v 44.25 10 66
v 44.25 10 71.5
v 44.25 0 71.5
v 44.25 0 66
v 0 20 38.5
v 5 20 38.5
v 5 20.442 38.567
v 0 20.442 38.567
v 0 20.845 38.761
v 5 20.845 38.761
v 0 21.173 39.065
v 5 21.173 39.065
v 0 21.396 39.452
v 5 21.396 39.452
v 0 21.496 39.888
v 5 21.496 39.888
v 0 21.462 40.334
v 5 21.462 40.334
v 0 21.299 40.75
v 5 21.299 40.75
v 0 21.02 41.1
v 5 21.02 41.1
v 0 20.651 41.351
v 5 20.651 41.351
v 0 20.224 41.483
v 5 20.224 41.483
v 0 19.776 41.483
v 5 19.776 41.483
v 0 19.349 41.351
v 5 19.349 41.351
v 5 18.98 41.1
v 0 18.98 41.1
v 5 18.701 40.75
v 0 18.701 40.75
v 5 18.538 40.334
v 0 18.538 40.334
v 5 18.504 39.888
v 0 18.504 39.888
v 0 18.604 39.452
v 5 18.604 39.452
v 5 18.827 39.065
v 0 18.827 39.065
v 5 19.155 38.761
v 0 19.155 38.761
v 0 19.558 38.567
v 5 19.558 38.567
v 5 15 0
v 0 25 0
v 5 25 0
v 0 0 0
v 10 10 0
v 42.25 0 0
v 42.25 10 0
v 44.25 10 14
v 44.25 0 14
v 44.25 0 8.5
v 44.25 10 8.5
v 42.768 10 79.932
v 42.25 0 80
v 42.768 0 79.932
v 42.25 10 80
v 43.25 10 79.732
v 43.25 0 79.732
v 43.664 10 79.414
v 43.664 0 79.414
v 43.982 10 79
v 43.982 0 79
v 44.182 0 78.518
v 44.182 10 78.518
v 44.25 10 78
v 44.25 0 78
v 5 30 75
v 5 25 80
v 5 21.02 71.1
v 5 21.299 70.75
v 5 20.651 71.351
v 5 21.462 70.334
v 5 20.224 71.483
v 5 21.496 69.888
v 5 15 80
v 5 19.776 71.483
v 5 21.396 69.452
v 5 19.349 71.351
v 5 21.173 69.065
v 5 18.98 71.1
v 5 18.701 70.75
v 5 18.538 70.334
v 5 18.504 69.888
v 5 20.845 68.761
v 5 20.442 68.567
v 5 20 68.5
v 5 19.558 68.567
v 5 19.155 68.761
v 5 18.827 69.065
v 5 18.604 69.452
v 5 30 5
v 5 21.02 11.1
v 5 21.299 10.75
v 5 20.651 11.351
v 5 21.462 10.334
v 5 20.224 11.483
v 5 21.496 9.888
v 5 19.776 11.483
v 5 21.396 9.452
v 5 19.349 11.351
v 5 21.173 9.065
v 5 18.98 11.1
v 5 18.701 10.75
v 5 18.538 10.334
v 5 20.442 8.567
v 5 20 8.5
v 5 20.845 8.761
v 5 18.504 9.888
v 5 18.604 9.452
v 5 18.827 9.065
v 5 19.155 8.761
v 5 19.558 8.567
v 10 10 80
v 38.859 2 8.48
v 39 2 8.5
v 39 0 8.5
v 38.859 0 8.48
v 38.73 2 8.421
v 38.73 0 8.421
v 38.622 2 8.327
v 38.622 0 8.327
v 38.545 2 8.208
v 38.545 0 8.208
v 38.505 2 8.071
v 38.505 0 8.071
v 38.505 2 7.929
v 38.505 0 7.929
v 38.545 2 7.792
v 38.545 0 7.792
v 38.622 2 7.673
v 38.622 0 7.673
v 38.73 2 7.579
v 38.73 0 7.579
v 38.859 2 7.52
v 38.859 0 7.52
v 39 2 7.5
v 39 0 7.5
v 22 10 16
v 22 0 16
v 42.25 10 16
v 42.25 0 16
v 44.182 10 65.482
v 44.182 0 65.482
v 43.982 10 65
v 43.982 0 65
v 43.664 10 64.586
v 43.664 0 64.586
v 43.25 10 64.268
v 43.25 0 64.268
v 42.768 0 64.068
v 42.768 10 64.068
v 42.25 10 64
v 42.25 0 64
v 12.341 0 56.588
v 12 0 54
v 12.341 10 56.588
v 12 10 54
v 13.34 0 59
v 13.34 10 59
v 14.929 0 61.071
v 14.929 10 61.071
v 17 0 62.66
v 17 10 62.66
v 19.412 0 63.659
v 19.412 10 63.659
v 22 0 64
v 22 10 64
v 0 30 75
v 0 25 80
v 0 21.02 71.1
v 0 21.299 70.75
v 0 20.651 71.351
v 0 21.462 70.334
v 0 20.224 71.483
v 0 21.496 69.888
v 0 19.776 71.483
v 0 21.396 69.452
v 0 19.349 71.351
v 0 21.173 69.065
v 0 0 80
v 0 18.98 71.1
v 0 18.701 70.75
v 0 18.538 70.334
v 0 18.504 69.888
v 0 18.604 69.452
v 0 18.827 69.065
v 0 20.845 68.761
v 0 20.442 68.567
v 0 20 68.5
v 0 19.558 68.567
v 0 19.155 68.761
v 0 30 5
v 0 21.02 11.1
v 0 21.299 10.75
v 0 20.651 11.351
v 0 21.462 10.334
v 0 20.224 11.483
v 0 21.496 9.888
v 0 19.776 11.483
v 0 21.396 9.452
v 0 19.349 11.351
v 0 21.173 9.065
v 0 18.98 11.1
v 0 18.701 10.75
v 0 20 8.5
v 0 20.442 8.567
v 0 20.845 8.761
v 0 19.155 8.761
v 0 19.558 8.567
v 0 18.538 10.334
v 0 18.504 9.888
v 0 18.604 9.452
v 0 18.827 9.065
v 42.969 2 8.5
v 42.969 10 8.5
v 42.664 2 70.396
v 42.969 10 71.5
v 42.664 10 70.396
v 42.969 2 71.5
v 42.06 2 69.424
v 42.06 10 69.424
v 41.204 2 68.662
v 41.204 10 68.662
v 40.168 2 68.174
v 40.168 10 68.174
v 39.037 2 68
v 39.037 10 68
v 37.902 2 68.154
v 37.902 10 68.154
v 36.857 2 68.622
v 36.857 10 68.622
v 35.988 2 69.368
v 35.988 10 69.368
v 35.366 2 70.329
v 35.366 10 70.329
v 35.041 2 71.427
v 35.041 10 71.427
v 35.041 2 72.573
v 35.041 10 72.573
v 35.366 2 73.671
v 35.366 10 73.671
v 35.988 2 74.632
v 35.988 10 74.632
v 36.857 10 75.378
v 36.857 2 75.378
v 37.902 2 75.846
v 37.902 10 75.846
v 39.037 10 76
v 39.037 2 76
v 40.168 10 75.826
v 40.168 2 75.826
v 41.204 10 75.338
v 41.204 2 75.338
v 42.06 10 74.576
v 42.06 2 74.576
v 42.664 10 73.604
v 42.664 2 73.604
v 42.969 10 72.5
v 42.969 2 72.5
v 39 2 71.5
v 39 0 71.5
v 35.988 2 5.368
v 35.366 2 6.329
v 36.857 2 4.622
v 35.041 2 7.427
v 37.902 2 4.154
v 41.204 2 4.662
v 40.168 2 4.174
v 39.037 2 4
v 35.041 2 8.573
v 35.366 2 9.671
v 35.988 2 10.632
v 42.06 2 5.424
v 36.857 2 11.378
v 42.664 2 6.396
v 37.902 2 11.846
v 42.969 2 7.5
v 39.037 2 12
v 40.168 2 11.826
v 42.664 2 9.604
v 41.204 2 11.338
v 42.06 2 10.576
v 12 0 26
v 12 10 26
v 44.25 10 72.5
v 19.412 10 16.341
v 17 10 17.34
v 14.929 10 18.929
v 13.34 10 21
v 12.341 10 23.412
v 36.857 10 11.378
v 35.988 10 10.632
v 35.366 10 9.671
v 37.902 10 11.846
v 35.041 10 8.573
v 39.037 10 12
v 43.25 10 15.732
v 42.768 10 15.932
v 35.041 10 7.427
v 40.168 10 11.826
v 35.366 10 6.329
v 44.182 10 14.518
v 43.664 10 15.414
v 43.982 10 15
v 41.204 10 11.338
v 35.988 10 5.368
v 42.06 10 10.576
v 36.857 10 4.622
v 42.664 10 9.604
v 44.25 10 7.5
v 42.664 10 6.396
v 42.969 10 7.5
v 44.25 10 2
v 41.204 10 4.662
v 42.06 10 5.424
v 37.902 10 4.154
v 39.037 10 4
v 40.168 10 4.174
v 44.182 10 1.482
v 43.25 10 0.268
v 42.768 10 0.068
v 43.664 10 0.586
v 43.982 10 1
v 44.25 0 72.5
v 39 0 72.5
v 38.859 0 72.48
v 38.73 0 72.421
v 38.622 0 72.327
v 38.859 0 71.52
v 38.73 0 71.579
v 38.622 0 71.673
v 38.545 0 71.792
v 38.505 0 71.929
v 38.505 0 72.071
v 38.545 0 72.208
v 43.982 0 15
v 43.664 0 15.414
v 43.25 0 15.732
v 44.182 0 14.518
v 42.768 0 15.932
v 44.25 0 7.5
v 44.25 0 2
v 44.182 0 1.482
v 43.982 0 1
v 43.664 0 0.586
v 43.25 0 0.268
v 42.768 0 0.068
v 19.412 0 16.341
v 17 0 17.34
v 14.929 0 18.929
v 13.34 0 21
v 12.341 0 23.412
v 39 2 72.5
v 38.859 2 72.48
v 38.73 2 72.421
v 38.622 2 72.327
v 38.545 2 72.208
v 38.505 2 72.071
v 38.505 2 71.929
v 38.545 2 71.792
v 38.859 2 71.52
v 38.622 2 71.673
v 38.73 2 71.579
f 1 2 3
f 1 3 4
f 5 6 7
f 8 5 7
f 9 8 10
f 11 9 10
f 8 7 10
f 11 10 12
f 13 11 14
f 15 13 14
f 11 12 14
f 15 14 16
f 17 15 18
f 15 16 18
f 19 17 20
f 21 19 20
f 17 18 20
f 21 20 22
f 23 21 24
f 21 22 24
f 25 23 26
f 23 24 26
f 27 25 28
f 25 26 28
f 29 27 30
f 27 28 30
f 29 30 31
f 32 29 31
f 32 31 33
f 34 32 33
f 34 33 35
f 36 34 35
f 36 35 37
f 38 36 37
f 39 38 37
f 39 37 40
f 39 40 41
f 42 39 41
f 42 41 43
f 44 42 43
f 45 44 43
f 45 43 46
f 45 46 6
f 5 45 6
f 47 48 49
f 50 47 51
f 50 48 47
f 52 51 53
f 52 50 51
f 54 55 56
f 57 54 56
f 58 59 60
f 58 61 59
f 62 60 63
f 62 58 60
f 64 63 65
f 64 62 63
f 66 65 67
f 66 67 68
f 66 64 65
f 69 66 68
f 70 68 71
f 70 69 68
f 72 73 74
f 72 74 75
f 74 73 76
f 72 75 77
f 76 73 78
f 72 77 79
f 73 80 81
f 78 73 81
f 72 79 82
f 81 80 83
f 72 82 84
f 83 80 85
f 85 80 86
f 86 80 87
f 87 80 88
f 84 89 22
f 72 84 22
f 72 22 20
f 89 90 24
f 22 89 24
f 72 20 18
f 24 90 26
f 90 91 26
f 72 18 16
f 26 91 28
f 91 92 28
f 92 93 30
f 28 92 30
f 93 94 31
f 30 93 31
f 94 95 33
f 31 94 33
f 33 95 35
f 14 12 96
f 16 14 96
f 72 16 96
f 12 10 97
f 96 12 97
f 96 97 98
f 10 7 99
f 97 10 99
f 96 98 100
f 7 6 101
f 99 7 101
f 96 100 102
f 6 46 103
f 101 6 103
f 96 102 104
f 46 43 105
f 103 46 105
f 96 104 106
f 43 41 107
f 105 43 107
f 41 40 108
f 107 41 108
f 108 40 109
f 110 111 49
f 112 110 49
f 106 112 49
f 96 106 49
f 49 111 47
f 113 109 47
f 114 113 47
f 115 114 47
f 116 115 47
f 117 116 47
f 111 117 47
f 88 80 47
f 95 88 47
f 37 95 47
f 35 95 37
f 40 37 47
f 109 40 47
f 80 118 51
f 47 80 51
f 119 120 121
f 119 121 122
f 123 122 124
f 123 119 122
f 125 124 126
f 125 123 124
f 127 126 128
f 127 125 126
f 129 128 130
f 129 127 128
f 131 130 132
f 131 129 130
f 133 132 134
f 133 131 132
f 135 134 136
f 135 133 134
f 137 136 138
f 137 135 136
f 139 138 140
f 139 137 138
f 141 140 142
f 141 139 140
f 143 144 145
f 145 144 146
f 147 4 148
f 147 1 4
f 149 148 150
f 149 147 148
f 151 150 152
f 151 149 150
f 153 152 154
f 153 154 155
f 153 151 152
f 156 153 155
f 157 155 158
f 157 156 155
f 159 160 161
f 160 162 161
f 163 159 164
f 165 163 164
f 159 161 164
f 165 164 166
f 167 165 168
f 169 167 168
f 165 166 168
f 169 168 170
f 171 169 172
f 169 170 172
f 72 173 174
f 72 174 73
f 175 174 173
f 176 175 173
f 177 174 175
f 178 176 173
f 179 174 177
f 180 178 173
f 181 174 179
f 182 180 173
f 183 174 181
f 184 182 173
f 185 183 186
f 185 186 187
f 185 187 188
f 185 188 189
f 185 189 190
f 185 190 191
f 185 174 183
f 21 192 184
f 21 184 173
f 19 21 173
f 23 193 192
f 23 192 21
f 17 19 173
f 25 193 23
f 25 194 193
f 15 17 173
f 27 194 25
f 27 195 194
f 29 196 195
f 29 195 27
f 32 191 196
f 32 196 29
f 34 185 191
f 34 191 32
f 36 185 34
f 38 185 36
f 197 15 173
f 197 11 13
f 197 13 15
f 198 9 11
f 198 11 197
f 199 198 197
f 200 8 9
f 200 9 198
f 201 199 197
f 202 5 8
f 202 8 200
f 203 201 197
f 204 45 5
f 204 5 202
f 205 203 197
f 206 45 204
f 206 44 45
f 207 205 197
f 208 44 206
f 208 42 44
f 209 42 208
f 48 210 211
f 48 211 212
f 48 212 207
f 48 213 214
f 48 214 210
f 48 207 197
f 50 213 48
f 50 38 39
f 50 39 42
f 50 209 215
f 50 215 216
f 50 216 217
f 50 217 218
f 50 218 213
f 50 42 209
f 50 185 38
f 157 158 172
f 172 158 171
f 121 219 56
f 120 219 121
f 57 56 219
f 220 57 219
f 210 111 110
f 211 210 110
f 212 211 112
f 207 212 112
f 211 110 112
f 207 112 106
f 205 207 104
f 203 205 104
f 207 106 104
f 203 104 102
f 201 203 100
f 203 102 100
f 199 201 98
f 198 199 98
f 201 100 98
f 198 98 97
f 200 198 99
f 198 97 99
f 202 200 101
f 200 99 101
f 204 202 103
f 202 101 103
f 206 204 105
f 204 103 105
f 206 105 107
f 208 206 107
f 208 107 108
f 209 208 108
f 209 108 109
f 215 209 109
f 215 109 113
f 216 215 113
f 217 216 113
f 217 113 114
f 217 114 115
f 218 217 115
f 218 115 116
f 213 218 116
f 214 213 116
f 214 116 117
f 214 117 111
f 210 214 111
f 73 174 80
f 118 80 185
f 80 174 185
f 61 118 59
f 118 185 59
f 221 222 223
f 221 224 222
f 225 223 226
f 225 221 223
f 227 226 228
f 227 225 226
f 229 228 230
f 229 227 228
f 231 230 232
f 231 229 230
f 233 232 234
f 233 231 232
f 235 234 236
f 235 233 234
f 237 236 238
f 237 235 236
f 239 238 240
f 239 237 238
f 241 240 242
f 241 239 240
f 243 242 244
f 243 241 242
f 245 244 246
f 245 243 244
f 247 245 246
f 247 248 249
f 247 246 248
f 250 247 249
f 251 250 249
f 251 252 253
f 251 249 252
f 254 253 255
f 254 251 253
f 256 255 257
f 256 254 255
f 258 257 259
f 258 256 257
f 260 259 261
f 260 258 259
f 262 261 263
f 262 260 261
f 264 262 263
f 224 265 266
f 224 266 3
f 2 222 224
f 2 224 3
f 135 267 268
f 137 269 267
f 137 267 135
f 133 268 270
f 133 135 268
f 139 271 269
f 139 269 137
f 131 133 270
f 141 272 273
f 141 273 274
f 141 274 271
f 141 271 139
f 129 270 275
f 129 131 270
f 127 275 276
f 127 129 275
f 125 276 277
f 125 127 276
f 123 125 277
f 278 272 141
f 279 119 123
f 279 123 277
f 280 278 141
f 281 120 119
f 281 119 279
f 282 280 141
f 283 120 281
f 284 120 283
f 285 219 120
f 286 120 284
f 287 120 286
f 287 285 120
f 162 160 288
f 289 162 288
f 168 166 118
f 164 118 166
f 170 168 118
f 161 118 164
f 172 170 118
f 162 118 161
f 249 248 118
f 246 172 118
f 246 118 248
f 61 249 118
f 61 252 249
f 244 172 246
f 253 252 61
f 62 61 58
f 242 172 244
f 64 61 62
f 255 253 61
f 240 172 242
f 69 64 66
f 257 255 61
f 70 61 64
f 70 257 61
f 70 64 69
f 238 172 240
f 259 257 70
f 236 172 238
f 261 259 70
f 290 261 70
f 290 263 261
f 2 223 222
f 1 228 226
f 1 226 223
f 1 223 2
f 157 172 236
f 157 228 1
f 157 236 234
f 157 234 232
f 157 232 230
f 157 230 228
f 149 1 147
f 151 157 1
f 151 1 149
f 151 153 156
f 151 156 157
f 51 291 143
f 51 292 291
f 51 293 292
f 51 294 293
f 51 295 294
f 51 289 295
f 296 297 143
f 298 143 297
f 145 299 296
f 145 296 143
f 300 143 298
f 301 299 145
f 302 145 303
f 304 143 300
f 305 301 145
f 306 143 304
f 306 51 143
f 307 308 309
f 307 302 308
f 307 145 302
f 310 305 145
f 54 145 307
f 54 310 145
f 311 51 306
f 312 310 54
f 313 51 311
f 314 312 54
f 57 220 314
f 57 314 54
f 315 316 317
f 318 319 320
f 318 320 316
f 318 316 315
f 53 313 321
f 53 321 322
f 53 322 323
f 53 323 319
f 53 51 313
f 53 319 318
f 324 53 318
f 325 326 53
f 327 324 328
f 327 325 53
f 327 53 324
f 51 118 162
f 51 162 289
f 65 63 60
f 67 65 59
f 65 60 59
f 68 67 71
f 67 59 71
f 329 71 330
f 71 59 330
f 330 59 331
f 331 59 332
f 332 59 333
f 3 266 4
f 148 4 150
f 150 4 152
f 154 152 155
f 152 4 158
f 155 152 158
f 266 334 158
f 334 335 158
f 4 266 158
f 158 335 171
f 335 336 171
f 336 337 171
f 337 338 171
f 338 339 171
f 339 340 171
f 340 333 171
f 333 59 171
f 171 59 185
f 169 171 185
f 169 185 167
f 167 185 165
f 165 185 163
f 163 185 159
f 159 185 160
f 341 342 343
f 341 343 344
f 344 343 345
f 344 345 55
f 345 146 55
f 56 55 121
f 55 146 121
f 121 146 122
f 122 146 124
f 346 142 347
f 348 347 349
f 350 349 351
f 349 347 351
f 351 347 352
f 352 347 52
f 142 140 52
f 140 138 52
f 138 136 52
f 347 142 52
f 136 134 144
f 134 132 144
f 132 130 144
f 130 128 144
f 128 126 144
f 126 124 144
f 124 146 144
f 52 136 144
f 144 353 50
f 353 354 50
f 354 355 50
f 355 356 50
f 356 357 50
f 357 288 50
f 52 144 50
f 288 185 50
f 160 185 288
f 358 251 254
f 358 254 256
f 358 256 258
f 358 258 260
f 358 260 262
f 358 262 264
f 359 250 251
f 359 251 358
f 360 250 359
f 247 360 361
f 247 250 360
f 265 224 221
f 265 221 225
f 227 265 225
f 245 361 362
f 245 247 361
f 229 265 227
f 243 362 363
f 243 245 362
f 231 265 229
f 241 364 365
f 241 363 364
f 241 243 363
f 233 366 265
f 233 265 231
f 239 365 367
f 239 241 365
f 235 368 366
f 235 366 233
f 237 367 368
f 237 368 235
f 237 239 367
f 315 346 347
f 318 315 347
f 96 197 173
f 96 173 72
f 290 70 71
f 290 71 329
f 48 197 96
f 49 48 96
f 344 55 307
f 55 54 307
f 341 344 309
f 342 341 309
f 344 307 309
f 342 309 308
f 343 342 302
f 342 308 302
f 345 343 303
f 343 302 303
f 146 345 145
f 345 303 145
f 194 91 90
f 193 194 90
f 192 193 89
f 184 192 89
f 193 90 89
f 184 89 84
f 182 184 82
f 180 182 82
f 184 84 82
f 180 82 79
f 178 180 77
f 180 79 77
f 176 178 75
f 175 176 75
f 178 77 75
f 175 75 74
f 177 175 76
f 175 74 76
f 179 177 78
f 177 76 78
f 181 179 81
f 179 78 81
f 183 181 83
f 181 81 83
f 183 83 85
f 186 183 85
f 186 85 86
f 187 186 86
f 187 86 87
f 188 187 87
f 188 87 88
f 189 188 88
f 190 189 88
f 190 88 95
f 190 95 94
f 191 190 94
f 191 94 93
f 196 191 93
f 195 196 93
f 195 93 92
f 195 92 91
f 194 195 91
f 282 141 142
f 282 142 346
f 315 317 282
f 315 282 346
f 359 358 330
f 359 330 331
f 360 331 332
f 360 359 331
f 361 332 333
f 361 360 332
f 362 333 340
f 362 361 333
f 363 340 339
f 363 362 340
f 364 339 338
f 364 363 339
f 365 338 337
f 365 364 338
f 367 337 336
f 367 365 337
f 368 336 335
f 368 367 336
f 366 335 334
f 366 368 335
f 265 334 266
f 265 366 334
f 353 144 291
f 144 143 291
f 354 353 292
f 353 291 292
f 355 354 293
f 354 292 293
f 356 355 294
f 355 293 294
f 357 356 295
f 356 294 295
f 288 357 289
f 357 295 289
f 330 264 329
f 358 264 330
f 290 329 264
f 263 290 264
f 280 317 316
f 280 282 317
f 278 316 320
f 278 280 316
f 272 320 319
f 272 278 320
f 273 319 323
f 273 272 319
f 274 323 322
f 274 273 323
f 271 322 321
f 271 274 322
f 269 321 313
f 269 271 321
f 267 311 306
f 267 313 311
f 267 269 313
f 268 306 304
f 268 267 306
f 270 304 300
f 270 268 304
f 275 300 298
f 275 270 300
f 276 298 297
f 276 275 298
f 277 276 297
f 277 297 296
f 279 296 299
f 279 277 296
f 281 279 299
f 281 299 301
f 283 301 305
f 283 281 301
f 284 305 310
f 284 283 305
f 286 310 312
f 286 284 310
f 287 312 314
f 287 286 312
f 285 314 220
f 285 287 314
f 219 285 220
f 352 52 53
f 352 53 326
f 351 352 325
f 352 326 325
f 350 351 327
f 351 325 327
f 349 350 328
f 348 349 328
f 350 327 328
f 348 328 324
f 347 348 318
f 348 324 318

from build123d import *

# Parameters (mm, degrees)
SKETCH1_R           = 4
BOSS_EXTRUDE1_DEPTH = 10
SKETCH2_W           = 5
SKETCH2_H           = 80
BOSS_EXTRUDE2_DEPTH = 20
BOSS_EXTRUDE3_START = -10
SKETCH5_R           = 4
BOSS_EXTRUDE3_DEPTH = 2
SKETCH3_R           = 1.5
CUT_EXTRUDE1_DEPTH  = 95.024265485
CUT_EXTRUDE2_DEPTH  = 94.584520622
CHAMFER2_SIZE       = 5
FILLET1_R           = 2
FILLET2_R           = 10
CHAMFER1_SIZE       = 5


with BuildPart() as part:
    # Sketch1 → Boss-Extrude1 (new body)
    with BuildSketch(Plane(origin=(0, 0, 0), x_dir=(1, 0, 0), z_dir=(0, 1, 0))):
        Polygon((0, 0), (0, -80), (44.25, -80), (44.25, -64), (12, -64), (12, -16), (44.25, -16), (44.25, 0), align=None)
        with Locations(Location((39, -8, 0), (0, 0, 270))):
            Circle(SKETCH1_R, mode=Mode.SUBTRACT)
        with Locations(Location((39, -72, 0), (0, 0, 90))):
            Circle(SKETCH1_R, mode=Mode.SUBTRACT)
    extrude(amount=BOSS_EXTRUDE1_DEPTH)

    # Sketch2 → Boss-Extrude2 (add)
    with BuildSketch(Plane(origin=(0, 10, 0), x_dir=(1, 0, 0), z_dir=(0, 1, 0))):
        with Locations((2.5, -40)):
            Rectangle(SKETCH2_W, SKETCH2_H)
    extrude(amount=BOSS_EXTRUDE2_DEPTH)

    # Sketch5 → Boss-Extrude3 (add)
    with BuildSketch(Plane(origin=(0, 10, 0), x_dir=(1, 0, 0), z_dir=(0, 1, 0)).offset(BOSS_EXTRUDE3_START)):
        with Locations(Location((39, -72, 0), (0, 0, 90))):
            Circle(SKETCH5_R)
        with Locations(Location((39, -8, 0), (0, 0, 270))):
            Circle(SKETCH5_R)
    extrude(amount=BOSS_EXTRUDE3_DEPTH)

    # Sketch3 → Cut-Extrude1 (cut, through all)
    with BuildSketch(Plane(origin=(5, 0, 0), x_dir=(0, 0, -1), z_dir=(1, 0, 0))):
        with Locations((-70, 20)):
            Circle(SKETCH3_R)
        with Locations((-40, 20)):
            Circle(SKETCH3_R)
        with Locations((-10, 20)):
            Circle(SKETCH3_R)
    extrude(amount=-CUT_EXTRUDE1_DEPTH, mode=Mode.SUBTRACT)

    # Sketch4 → Cut-Extrude2 (cut, through all)
    with BuildSketch(Plane(origin=(0, 10, 0), x_dir=(1, 0, 0), z_dir=(0, 1, 0))):
        with BuildLine():
            Line((39, -7.5), (44.25, -7.5))
            ThreePointArc((44.25, -7.5), (44.75, -8), (44.25, -8.5))
            Line((44.25, -8.5), (39, -8.5))
            ThreePointArc((39, -8.5), (38.5, -8), (39, -7.5))
        make_face()
        with BuildLine():
            Line((39, -71.5), (44.25, -71.5))
            ThreePointArc((44.25, -71.5), (44.75, -72), (44.25, -72.5))
            Line((44.25, -72.5), (39, -72.5))
            ThreePointArc((39, -72.5), (38.5, -72), (39, -71.5))
        make_face()
    extrude(amount=-CUT_EXTRUDE2_DEPTH, mode=Mode.SUBTRACT)

    # Chamfer2
    chamfer2_edges = [part.edges().sort_by_distance(p)[0] for p in [
        (5, 10, 40),
    ]]
    chamfer(chamfer2_edges, length=CHAMFER2_SIZE)

    # Fillet1
    fillet1_edges = [part.edges().sort_by_distance(p)[0] for p in [
        (44.25, 5, 0),
        (44.25, 5, 16),
        (44.25, 5, 64),
        (44.25, 5, 80),
    ]]
    fillet(fillet1_edges, radius=FILLET1_R)

    # Fillet2
    fillet2_edges = [part.edges().sort_by_distance(p)[0] for p in [
        (12, 5, 16),
        (12, 5, 64),
    ]]
    fillet(fillet2_edges, radius=FILLET2_R)

    # Chamfer1
    chamfer1_edges = [part.edges().sort_by_distance(p)[0] for p in [
        (2.5, 30, 80),
        (2.5, 30, 0),
    ]]
    chamfer(chamfer1_edges, length=CHAMFER1_SIZE)


solid = part.part
